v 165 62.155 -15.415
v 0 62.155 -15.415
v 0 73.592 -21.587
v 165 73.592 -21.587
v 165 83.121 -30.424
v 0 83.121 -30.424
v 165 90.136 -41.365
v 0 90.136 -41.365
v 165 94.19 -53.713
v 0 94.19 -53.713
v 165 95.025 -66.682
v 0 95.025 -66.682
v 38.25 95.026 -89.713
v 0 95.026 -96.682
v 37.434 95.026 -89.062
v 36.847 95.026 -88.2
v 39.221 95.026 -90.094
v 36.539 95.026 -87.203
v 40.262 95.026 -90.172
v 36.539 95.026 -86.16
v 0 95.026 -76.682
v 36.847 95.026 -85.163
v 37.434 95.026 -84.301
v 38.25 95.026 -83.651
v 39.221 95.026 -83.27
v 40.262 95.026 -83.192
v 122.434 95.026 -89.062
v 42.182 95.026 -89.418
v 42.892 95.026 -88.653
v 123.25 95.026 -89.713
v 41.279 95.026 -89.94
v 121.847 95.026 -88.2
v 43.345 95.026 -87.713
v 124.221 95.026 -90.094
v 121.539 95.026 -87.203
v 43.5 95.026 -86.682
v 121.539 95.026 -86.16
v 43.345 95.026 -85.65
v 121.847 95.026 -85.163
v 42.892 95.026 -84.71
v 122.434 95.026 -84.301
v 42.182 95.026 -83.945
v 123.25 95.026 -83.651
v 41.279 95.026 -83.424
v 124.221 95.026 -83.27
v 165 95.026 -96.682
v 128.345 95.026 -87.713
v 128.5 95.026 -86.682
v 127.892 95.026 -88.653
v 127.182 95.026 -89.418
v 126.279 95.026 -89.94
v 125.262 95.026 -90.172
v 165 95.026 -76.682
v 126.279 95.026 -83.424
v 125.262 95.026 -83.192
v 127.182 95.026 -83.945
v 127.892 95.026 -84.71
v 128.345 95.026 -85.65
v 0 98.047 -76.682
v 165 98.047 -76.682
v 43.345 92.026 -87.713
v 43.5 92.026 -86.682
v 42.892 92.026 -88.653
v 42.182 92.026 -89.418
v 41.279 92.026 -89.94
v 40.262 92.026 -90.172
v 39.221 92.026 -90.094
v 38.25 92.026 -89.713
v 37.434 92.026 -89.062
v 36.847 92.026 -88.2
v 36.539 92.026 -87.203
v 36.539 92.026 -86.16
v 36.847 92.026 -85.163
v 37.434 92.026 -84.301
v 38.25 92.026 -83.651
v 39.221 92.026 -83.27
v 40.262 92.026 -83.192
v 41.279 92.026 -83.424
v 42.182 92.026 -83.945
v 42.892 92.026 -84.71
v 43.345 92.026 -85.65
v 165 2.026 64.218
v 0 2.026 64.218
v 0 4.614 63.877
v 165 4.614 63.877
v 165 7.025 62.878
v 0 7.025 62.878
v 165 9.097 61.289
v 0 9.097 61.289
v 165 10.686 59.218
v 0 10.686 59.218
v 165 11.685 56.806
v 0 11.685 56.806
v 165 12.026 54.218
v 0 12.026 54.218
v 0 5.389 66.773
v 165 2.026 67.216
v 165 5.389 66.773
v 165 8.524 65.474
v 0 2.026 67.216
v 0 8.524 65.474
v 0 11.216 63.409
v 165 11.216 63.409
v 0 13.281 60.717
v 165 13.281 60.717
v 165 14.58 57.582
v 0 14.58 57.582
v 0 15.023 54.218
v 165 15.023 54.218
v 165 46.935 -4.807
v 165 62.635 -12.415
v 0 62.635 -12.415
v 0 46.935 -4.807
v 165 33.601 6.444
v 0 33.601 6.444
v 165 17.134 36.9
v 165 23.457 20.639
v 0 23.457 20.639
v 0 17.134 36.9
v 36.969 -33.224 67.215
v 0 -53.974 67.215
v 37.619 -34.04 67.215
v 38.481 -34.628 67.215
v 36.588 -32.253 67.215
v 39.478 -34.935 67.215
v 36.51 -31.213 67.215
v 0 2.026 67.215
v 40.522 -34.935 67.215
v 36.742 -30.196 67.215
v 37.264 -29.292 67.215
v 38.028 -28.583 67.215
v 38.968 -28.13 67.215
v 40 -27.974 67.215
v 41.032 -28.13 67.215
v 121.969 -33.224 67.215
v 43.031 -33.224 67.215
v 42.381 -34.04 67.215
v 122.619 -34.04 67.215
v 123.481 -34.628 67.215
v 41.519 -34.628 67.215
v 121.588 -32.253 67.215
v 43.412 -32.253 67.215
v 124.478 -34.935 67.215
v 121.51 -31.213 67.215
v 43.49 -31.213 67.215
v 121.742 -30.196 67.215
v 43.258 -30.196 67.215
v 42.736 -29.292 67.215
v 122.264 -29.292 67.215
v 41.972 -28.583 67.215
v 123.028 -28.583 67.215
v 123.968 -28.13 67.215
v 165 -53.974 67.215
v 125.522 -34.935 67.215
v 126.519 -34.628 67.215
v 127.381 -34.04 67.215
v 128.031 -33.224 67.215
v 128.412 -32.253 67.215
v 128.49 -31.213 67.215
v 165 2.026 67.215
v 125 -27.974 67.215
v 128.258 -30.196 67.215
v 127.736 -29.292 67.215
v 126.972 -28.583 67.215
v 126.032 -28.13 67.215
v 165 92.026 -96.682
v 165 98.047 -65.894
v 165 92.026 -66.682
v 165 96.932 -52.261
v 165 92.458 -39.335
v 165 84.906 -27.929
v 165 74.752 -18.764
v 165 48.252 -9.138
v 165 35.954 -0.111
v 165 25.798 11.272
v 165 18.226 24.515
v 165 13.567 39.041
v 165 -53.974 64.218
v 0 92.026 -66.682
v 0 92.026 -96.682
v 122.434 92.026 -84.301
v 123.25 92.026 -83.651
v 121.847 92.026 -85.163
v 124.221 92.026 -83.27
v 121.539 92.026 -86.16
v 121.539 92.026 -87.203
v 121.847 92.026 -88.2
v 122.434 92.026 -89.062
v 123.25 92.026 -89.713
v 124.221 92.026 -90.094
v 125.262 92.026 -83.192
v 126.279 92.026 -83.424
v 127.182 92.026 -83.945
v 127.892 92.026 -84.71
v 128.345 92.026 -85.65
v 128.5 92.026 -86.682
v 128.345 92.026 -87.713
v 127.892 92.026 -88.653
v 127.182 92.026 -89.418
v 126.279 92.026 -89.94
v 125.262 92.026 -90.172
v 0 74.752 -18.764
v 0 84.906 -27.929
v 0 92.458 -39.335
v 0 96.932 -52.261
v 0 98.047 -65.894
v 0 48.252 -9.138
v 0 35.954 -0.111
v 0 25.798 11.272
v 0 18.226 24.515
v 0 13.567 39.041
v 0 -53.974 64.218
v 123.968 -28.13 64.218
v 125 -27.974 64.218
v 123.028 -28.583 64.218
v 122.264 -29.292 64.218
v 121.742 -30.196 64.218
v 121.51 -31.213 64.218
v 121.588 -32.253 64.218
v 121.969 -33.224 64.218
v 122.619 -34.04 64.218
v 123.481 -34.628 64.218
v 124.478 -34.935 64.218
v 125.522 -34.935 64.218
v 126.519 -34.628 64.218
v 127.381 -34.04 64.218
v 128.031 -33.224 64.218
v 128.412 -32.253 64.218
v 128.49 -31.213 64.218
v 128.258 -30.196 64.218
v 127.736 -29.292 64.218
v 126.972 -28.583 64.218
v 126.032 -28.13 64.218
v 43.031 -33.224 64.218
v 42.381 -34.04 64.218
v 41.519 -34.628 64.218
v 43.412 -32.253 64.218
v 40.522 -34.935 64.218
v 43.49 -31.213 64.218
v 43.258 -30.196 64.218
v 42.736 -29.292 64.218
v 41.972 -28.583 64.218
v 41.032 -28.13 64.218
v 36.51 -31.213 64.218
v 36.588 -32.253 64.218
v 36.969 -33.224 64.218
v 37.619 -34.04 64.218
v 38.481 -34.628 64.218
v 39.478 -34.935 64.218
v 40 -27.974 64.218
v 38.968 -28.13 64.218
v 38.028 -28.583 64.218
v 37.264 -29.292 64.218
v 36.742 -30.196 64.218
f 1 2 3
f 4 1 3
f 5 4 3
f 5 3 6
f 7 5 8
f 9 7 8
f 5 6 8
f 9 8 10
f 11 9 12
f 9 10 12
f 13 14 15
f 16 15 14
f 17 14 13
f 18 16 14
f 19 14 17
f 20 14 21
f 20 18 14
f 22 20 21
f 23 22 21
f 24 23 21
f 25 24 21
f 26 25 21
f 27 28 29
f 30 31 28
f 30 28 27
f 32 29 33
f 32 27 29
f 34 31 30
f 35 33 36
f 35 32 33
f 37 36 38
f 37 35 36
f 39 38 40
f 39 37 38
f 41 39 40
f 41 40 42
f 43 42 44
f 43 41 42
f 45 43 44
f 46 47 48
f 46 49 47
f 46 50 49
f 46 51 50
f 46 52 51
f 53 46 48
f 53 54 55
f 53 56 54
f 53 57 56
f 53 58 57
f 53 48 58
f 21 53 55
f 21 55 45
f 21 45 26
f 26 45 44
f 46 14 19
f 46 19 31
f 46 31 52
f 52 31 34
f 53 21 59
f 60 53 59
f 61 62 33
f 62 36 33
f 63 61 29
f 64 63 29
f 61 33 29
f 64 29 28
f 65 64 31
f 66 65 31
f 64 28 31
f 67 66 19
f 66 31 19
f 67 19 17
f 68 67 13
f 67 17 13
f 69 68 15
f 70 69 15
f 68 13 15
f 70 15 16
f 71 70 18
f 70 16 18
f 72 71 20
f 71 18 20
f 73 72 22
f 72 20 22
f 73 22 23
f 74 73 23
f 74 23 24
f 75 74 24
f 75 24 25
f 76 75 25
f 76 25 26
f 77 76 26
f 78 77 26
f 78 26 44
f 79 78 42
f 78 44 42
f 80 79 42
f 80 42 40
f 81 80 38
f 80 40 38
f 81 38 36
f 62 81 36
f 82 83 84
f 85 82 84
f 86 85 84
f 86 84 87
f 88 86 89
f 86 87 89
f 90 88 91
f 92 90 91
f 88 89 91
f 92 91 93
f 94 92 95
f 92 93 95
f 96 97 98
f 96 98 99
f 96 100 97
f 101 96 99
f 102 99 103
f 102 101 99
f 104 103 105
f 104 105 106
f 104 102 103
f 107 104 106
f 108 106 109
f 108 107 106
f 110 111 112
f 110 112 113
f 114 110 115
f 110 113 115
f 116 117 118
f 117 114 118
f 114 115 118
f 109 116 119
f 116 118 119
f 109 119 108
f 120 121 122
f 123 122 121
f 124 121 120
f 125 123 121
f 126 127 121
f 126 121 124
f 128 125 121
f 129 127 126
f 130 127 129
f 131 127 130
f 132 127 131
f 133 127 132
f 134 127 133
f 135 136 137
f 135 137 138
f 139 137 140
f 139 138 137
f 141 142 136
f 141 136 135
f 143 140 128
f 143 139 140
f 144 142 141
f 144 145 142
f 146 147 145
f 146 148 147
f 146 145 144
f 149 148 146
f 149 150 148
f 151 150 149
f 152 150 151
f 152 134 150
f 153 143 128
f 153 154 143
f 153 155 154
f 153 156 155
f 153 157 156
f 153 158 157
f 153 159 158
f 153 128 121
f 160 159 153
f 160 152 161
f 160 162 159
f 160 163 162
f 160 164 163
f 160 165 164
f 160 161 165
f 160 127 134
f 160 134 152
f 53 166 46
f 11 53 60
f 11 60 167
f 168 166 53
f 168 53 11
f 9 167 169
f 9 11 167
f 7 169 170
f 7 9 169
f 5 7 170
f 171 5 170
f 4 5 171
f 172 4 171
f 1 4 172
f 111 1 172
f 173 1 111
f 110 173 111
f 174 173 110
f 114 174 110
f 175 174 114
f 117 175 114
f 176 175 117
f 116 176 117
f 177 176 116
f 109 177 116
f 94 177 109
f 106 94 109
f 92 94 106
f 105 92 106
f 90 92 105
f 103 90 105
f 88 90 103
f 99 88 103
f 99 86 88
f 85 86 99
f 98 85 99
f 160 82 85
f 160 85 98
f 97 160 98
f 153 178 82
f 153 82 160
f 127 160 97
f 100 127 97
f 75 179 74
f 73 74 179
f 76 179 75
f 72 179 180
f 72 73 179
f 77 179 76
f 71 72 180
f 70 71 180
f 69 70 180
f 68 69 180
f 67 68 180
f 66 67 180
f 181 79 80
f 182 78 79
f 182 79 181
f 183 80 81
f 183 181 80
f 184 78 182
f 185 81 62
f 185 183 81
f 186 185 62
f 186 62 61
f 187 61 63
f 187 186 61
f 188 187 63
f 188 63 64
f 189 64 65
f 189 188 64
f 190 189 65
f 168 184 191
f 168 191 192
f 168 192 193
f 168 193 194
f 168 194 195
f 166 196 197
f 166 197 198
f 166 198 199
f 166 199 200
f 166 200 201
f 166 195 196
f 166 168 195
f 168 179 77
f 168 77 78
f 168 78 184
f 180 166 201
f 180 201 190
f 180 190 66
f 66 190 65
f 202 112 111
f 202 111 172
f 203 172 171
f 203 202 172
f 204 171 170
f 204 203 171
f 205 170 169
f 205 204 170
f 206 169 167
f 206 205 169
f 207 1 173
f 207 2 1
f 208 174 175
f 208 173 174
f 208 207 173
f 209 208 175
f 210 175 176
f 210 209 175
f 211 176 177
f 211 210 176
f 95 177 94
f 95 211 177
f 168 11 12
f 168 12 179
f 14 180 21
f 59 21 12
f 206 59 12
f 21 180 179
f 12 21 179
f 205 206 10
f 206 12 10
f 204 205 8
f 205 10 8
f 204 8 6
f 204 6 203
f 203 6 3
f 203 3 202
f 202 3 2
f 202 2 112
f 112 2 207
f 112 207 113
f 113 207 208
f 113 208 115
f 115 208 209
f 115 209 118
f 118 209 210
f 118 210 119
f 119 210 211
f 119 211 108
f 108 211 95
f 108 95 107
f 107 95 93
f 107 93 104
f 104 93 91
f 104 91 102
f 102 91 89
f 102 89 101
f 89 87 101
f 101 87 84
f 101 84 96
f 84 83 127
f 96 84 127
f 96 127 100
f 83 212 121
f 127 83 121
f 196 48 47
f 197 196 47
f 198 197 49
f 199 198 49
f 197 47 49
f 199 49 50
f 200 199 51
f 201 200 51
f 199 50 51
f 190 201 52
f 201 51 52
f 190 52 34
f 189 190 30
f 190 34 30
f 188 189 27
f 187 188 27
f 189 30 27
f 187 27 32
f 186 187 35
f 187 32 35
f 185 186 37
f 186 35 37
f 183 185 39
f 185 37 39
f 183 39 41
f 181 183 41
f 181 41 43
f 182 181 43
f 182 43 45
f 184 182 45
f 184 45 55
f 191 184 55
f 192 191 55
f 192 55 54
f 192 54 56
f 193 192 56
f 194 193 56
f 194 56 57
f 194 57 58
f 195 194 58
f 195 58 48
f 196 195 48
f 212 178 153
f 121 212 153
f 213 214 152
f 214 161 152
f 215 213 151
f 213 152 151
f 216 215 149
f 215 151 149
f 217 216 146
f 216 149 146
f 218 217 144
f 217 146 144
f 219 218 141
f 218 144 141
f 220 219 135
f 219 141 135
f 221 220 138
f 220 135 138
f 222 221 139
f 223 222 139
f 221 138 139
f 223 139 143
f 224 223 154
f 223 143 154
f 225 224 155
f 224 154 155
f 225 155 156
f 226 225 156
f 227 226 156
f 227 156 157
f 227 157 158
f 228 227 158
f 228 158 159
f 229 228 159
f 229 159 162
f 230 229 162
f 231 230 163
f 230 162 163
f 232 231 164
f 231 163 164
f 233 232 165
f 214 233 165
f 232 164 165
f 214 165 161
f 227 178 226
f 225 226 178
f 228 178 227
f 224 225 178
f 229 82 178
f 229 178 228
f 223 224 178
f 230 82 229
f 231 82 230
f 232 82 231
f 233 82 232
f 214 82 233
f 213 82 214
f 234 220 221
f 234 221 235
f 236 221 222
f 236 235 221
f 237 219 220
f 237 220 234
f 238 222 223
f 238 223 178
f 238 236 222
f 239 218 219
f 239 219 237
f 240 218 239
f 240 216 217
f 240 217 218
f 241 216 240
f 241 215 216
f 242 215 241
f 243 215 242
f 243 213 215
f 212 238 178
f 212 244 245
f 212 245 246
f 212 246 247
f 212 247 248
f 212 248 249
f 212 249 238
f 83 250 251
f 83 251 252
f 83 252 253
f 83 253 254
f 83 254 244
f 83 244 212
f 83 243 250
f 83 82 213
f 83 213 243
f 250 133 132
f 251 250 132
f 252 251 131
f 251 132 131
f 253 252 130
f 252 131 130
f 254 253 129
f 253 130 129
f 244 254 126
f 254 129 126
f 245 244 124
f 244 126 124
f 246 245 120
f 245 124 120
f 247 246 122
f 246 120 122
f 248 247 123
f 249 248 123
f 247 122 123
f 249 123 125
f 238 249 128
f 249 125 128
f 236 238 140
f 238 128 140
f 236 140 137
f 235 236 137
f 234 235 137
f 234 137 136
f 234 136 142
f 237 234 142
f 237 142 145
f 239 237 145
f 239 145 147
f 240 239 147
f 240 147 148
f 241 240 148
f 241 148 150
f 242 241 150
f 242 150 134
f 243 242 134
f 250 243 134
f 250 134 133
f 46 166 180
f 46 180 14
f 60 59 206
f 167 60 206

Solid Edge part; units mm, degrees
sketch "Sketch1" plane through (0, 0, 0) normal (1, 0, 0) x (0, 1, 0)
  arc A0 (2.0255, 64.2182) -> (12.0255, 54.2182) centre (2.0255, 54.2182) cw
  arc A1 (12.0255, 54.2182) -> (62.1552, -15.4154) centre (85.1165, 53.9757) ccw
  arc A2 (62.1552, -15.4154) -> (95.0255, -66.6818) centre (43.6001, -63.4831) cw
  line L0 (95.0255, -66.6818) -> (95.0255, -76.6818)
  line L1 (95.0255, -76.6818) -> (98.0468, -76.6818)
  line L2 (98.0468, -76.6818) -> (98.0468, -65.8944)
  arc A3 (62.6354, -12.4154) -> (98.0468, -65.8944) centre (43.6001, -63.4831) cw
  arc A4 (15.0228, 54.2182) -> (62.6354, -12.4154) centre (85.1165, 53.9757) ccw
  arc A5 (2.0255, 67.2155) -> (15.0228, 54.2182) centre (2.0255, 54.2182) cw
  line L3 (2.0255, 64.2182) -> (2.0255, 67.2155)
  dimension "D1" = 130.9
  dimension "D2" = 93
  dimension "D3" = 10
  dimension "D4" = 10
  dimension "D5" = 3
  dimension "D6" = 2.9973
  dimension "D7" = 12.9973
extrude "Protrusion1" add sketch "Sketch1" along normal blind 165
sketch "Sketch2" plane through (75, 2.0255, 65.7168) normal (0, -1, 0) x (1, 0, 0)
  line L0 (-75, 1.4986) -> (90, 1.4986)
  line L1 (90, 1.4986) -> (90, -1.4986)
  line L2 (90, -1.4986) -> (-75, -1.4986)
  line L3 (-75, -1.4986) -> (-75, 1.4986)
extrude "Extrusionsausprägung_2" add sketch "Sketch2" along normal blind 56
sketch "Sketch3" plane through (82.5, -22.9745, 67.2155) normal (0, 0, 1) x (0, 1, 0)
  circle A0 centre (-8.5, 42.5) radius 3.5
  circle A1 centre (-8.5, -42.5) radius 3.5
  dimension "D1" = 40
  dimension "D2" = 22.5
  dimension "D3" = 7
extrude "Cutout1" cut sketch "Sketch3" against normal through all
sketch "Sketch4" plane through (165, 28.0437, -4.7332) normal (1, 0, 0) x (0, 1, 0)
  line L0 (66.9818, -61.9486) -> (63.9818, -61.9486)
  line L1 (63.9818, -61.9486) -> (63.9818, -91.9486)
  line L2 (63.9818, -91.9486) -> (66.9818, -91.9486)
  line L3 (66.9818, -91.9486) -> (66.9818, -61.9486)
  dimension "D1" = 3
  dimension "D2" = 30
extrude "Protrusion2" add sketch "Sketch4" against normal up to vertex (165 mm away)
sketch "Sketch5" plane through (82.5, 95.0255, -86.6818) normal (0, 1, 0) x (1, 0, 0)
  circle A0 centre (-42.5, 0) radius 3.5
  circle A1 centre (42.5, 0) radius 3.5
  dimension "D1" = 85
  dimension "D2" = 7
extrude "Cutout2" cut sketch "Sketch5" against normal through all
properties material "Nylon, allgemein"
